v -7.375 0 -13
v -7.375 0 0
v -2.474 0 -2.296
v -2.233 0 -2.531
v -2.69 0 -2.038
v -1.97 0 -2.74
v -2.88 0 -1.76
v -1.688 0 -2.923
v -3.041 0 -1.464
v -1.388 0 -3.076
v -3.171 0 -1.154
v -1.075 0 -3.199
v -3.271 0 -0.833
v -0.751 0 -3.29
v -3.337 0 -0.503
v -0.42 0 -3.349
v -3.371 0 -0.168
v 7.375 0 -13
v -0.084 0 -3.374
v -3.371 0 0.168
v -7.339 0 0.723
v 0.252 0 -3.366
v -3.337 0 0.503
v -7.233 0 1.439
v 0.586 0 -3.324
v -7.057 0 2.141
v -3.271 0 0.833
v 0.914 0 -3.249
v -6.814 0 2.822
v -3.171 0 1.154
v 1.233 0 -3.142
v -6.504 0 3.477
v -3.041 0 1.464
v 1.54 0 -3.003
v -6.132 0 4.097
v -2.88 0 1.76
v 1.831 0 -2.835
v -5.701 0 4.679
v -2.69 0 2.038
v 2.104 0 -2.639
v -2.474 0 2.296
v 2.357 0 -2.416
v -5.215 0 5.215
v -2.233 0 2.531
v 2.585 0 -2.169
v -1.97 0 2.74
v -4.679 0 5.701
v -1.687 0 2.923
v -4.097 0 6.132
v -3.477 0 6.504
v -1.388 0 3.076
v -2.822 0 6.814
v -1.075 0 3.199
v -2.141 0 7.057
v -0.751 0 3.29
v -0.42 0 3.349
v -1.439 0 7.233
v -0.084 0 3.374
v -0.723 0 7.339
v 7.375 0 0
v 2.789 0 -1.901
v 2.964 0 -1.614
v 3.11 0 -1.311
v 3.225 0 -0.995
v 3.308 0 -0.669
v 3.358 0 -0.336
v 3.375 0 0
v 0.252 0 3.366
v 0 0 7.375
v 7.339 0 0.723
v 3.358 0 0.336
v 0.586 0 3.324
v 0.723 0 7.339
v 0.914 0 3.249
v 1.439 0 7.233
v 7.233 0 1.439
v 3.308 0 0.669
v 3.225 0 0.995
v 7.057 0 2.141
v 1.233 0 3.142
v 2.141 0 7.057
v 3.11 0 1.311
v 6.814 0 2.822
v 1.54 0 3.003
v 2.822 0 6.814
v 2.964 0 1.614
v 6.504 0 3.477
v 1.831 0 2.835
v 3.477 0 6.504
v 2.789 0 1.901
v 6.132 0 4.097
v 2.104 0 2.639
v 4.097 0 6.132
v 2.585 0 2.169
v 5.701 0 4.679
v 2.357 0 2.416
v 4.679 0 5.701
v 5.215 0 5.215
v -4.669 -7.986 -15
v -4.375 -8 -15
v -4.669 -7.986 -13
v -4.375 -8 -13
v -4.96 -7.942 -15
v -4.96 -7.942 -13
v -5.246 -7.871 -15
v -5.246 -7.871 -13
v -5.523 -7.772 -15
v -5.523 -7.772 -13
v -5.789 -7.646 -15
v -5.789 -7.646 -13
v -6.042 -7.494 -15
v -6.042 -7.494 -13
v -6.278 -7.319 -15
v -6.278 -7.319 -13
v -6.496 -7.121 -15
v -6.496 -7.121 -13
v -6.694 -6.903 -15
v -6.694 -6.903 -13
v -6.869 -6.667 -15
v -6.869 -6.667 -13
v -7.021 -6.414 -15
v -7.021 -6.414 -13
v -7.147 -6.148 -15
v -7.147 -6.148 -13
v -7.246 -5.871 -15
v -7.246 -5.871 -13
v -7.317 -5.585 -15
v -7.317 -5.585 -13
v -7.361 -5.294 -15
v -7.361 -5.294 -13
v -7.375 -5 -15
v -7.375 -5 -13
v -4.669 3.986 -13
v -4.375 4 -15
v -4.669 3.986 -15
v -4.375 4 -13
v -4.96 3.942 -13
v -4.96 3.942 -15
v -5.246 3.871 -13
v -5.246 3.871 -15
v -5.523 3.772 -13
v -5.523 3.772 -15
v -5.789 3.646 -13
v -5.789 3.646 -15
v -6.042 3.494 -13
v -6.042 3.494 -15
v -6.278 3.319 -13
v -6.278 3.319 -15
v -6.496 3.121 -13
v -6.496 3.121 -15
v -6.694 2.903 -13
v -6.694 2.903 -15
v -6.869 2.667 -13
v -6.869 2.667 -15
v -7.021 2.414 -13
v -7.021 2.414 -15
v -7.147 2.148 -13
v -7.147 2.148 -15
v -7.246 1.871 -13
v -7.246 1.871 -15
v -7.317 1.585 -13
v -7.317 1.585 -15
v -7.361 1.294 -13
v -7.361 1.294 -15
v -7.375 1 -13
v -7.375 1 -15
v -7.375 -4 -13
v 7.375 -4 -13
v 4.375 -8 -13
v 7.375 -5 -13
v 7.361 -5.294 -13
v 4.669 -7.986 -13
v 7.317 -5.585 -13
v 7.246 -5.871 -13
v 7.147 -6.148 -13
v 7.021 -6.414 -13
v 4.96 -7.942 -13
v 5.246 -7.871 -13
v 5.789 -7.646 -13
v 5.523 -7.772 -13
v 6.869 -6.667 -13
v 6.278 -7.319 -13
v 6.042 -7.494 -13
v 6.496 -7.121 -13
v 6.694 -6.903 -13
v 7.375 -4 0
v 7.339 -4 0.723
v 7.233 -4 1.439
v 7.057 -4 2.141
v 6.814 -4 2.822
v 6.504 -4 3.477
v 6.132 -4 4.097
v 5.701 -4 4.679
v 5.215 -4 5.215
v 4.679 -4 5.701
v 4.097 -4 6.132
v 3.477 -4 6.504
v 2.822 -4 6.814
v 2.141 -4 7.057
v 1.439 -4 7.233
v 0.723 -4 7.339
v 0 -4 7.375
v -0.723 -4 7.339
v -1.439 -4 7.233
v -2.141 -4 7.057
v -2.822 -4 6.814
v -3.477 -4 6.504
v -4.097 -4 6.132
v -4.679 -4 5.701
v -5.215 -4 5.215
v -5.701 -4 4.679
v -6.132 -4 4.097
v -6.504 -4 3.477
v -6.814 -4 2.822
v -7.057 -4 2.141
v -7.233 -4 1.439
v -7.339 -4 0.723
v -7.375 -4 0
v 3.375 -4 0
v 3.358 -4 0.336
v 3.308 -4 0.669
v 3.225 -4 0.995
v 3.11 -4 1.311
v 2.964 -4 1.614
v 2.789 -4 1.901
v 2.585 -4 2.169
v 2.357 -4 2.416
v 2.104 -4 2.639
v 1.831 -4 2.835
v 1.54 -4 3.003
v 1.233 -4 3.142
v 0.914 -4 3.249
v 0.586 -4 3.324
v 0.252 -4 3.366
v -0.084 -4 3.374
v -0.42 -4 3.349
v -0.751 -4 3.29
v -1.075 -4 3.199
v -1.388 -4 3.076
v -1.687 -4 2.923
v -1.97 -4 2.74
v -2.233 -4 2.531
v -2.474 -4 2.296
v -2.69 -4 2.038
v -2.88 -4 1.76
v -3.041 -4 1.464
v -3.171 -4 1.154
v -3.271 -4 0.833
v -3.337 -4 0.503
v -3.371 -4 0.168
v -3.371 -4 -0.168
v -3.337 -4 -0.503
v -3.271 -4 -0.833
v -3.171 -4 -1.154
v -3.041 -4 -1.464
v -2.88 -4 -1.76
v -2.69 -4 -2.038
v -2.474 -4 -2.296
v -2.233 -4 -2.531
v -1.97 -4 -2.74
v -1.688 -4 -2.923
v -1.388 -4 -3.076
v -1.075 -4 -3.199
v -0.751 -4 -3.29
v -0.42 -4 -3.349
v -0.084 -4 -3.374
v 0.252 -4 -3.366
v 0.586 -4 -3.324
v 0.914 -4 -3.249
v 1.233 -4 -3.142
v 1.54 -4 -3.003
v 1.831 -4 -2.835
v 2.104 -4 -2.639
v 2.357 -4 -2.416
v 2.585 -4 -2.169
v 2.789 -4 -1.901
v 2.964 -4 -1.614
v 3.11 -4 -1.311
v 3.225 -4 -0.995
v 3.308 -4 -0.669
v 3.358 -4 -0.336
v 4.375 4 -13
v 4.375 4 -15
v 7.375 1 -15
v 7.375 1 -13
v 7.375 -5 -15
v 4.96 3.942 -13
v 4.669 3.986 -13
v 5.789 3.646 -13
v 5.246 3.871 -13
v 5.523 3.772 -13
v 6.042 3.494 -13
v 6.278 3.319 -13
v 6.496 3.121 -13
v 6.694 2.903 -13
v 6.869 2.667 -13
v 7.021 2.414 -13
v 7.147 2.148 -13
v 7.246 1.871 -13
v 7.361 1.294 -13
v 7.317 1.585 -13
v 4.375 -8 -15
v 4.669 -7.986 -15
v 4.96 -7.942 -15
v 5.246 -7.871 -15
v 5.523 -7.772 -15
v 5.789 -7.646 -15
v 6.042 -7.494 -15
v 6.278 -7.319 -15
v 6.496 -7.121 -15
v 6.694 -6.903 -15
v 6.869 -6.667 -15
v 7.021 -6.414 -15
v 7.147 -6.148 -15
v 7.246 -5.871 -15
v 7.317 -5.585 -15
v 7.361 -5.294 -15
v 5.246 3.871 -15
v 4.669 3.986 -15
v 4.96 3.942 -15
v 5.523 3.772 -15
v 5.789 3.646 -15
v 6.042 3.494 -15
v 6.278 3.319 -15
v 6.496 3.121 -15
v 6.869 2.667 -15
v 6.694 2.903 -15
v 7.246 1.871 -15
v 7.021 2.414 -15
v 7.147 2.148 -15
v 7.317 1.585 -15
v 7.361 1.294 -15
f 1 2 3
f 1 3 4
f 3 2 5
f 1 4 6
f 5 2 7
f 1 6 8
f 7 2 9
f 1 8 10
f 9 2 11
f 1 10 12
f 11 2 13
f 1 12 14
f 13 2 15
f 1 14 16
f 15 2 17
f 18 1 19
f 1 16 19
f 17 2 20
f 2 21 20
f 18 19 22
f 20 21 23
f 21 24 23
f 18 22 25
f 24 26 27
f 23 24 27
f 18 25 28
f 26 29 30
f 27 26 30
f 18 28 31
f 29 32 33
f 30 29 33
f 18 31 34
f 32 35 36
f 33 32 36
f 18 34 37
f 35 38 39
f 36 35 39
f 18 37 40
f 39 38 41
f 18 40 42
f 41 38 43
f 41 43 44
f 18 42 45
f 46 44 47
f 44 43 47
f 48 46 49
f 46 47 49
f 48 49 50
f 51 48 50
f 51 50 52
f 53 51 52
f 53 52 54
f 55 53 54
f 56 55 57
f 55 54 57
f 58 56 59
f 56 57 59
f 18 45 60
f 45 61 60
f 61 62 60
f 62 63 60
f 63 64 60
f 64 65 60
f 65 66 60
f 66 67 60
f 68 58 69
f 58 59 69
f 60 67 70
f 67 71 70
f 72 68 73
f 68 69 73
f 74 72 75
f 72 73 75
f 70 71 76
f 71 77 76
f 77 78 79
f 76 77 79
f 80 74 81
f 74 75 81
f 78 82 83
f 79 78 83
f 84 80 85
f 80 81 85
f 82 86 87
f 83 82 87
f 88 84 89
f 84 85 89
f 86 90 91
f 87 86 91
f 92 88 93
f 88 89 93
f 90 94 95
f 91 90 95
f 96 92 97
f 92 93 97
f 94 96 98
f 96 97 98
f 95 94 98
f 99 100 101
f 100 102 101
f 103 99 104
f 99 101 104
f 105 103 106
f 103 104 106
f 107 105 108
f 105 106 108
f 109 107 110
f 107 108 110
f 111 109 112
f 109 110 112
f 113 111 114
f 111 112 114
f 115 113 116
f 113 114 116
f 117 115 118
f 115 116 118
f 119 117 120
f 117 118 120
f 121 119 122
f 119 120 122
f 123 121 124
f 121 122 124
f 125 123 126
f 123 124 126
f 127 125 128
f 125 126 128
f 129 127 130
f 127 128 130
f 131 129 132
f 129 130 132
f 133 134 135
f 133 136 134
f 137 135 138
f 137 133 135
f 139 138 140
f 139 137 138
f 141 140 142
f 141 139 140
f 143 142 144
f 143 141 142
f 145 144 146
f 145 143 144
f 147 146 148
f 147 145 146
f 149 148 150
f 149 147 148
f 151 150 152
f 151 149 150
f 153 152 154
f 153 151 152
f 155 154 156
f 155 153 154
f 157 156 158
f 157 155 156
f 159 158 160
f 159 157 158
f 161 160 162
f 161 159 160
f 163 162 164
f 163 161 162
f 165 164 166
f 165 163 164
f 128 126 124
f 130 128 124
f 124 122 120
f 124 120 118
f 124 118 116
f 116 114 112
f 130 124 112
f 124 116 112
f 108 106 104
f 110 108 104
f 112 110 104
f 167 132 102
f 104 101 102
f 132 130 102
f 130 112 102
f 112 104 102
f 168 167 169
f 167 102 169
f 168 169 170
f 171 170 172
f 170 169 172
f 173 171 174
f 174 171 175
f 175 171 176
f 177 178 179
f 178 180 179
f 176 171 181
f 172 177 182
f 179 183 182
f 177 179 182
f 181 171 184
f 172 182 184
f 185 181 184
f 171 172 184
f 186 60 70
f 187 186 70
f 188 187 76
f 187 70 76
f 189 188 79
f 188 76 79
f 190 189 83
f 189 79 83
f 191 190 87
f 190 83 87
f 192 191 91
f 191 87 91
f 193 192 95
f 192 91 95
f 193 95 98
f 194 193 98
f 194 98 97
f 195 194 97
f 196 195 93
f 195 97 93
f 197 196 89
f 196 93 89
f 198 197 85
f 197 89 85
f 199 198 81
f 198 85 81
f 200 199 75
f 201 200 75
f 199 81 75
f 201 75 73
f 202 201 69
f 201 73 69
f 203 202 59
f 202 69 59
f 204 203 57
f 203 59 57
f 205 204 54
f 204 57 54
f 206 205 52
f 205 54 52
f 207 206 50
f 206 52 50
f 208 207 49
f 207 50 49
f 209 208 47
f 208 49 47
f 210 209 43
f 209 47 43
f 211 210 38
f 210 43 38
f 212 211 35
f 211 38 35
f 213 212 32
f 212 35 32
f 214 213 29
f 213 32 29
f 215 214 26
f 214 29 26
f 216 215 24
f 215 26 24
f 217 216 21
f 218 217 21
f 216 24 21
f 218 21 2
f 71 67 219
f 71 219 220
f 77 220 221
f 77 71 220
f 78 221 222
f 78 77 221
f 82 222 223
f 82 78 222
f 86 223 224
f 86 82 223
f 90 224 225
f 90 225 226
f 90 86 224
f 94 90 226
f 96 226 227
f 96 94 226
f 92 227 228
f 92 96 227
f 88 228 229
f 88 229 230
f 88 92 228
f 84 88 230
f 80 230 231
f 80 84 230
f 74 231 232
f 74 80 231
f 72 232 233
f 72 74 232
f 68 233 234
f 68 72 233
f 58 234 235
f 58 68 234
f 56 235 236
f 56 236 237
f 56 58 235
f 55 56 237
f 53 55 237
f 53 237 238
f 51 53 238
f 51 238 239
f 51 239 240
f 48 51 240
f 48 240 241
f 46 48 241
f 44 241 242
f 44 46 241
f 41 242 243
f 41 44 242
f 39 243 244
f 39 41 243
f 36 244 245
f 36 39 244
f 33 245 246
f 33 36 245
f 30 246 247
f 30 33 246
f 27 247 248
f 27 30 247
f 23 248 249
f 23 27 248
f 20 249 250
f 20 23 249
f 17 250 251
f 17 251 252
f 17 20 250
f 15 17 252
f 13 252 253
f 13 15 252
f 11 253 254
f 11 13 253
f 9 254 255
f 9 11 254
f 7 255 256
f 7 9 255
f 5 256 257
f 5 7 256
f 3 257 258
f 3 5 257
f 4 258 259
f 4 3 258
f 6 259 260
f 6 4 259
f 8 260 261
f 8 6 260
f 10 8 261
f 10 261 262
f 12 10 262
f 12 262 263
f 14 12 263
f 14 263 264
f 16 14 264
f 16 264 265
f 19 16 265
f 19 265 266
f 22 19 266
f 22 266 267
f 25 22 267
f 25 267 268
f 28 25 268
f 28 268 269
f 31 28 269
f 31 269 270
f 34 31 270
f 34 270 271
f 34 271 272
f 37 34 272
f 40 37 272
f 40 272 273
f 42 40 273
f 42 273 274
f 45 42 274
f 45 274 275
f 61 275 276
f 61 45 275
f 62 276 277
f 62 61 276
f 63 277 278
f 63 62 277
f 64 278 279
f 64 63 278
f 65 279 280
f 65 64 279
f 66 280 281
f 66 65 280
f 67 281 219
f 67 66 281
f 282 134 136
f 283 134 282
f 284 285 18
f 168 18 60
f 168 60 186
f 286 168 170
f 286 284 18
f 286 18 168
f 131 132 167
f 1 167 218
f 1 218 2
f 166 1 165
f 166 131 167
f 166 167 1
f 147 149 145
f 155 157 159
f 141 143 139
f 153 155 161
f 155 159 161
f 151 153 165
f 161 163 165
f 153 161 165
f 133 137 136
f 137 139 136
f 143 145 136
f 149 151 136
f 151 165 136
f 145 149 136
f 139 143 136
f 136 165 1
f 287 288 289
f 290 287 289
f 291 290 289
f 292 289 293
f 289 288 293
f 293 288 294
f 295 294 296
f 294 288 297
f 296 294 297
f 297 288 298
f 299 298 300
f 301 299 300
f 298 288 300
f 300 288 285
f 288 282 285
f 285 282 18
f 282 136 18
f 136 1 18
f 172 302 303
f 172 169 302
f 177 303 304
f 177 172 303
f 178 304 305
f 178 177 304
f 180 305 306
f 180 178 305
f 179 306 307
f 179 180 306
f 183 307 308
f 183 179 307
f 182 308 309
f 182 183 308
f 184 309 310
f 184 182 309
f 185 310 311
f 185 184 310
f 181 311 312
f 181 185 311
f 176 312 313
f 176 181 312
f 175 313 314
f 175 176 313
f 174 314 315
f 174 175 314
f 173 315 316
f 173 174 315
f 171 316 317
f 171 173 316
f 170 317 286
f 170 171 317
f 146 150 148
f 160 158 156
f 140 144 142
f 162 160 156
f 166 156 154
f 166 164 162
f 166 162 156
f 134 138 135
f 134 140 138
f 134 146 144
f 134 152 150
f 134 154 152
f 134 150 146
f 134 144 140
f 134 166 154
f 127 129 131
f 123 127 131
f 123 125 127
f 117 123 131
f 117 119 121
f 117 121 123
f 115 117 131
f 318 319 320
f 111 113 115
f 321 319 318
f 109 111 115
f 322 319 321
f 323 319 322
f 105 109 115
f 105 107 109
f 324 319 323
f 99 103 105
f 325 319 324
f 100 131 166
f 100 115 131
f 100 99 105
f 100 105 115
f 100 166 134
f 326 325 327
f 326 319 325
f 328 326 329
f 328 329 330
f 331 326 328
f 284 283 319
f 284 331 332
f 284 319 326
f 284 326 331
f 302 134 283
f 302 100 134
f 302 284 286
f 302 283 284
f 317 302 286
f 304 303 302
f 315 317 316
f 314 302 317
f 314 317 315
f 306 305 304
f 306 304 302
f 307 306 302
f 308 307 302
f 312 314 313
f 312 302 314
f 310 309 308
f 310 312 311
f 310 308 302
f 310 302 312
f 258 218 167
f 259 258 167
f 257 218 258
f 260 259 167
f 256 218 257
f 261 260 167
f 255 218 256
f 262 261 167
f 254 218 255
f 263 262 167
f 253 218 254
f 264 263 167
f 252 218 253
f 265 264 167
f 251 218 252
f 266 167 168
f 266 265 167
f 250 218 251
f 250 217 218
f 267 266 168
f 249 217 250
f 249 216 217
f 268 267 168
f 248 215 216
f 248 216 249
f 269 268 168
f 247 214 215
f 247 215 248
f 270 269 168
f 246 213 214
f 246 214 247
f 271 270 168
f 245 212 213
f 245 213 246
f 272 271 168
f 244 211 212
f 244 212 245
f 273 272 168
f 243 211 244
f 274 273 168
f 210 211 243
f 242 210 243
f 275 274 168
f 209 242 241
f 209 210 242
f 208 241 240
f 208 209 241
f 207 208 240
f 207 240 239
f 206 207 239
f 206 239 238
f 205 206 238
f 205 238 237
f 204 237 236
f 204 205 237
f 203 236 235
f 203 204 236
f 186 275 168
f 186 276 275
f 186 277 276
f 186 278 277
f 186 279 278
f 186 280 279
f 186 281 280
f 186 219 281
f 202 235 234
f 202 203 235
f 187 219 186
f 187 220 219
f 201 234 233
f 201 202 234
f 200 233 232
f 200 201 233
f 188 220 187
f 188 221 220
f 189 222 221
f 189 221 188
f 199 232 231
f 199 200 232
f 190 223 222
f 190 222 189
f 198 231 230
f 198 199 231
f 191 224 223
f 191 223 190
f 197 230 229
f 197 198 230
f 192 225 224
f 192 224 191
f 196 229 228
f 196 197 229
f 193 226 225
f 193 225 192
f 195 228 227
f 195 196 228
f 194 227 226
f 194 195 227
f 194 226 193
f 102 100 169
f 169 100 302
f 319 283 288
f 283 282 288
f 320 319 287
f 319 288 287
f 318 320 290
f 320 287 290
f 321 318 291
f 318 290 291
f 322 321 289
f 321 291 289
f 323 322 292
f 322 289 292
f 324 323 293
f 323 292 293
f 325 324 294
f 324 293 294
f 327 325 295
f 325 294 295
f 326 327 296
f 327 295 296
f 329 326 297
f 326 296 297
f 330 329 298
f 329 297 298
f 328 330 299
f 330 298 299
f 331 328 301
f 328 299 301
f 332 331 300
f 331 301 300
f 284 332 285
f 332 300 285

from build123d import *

# Parameters (mm, degrees)
F0_R     = 3.375
F1_DEPTH = 4
F2_W     = 14.75
F2_H     = 4
F3_DEPTH = 2
F4_R     = 3


with BuildPart() as f1:
    # F0 (on Front) → F1 (new body)
    with BuildSketch(Plane.XZ):
        with BuildLine():
            Line((7.375, -15), (7.375, 0))
            ThreePointArc((7.375, 0), (0, -7.375), (-7.375, 0))
            Line((-7.375, 0), (-7.375, -15))
            Line((-7.375, -15), (7.375, -15))
        make_face()
        with BuildLine():
            ThreePointArc((-7.375, 0), (0, -7.375), (7.375, 0))
            ThreePointArc((7.375, 0), (0, 7.375), (-7.375, 0))
        make_face()
        Circle(F0_R, mode=Mode.SUBTRACT)
    extrude(amount=F1_DEPTH)

    # F2 (on face) → F3 (join)
    with BuildSketch(Plane(origin=(0, 0, -15), x_dir=(1, 0, 0), z_dir=(0, 0, -1))):
        with Locations((0, -2)):
            Rectangle(F2_W, F2_H)
        with Locations((0, 2)):
            Rectangle(F2_W, F2_H)
        with Locations((0, 6)):
            Rectangle(F2_W, F2_H)
    extrude(amount=-F3_DEPTH)

    # F4
    f4_edges = [f1.edges().sort_by_distance(p)[0] for p in [
        (-7.375, -8, -14),
        (7.375, -8, -14),
        (-7.375, 4, -14),
        (7.375, 4, -14),
    ]]
    fillet(f4_edges, radius=F4_R)


solid = f1.part
